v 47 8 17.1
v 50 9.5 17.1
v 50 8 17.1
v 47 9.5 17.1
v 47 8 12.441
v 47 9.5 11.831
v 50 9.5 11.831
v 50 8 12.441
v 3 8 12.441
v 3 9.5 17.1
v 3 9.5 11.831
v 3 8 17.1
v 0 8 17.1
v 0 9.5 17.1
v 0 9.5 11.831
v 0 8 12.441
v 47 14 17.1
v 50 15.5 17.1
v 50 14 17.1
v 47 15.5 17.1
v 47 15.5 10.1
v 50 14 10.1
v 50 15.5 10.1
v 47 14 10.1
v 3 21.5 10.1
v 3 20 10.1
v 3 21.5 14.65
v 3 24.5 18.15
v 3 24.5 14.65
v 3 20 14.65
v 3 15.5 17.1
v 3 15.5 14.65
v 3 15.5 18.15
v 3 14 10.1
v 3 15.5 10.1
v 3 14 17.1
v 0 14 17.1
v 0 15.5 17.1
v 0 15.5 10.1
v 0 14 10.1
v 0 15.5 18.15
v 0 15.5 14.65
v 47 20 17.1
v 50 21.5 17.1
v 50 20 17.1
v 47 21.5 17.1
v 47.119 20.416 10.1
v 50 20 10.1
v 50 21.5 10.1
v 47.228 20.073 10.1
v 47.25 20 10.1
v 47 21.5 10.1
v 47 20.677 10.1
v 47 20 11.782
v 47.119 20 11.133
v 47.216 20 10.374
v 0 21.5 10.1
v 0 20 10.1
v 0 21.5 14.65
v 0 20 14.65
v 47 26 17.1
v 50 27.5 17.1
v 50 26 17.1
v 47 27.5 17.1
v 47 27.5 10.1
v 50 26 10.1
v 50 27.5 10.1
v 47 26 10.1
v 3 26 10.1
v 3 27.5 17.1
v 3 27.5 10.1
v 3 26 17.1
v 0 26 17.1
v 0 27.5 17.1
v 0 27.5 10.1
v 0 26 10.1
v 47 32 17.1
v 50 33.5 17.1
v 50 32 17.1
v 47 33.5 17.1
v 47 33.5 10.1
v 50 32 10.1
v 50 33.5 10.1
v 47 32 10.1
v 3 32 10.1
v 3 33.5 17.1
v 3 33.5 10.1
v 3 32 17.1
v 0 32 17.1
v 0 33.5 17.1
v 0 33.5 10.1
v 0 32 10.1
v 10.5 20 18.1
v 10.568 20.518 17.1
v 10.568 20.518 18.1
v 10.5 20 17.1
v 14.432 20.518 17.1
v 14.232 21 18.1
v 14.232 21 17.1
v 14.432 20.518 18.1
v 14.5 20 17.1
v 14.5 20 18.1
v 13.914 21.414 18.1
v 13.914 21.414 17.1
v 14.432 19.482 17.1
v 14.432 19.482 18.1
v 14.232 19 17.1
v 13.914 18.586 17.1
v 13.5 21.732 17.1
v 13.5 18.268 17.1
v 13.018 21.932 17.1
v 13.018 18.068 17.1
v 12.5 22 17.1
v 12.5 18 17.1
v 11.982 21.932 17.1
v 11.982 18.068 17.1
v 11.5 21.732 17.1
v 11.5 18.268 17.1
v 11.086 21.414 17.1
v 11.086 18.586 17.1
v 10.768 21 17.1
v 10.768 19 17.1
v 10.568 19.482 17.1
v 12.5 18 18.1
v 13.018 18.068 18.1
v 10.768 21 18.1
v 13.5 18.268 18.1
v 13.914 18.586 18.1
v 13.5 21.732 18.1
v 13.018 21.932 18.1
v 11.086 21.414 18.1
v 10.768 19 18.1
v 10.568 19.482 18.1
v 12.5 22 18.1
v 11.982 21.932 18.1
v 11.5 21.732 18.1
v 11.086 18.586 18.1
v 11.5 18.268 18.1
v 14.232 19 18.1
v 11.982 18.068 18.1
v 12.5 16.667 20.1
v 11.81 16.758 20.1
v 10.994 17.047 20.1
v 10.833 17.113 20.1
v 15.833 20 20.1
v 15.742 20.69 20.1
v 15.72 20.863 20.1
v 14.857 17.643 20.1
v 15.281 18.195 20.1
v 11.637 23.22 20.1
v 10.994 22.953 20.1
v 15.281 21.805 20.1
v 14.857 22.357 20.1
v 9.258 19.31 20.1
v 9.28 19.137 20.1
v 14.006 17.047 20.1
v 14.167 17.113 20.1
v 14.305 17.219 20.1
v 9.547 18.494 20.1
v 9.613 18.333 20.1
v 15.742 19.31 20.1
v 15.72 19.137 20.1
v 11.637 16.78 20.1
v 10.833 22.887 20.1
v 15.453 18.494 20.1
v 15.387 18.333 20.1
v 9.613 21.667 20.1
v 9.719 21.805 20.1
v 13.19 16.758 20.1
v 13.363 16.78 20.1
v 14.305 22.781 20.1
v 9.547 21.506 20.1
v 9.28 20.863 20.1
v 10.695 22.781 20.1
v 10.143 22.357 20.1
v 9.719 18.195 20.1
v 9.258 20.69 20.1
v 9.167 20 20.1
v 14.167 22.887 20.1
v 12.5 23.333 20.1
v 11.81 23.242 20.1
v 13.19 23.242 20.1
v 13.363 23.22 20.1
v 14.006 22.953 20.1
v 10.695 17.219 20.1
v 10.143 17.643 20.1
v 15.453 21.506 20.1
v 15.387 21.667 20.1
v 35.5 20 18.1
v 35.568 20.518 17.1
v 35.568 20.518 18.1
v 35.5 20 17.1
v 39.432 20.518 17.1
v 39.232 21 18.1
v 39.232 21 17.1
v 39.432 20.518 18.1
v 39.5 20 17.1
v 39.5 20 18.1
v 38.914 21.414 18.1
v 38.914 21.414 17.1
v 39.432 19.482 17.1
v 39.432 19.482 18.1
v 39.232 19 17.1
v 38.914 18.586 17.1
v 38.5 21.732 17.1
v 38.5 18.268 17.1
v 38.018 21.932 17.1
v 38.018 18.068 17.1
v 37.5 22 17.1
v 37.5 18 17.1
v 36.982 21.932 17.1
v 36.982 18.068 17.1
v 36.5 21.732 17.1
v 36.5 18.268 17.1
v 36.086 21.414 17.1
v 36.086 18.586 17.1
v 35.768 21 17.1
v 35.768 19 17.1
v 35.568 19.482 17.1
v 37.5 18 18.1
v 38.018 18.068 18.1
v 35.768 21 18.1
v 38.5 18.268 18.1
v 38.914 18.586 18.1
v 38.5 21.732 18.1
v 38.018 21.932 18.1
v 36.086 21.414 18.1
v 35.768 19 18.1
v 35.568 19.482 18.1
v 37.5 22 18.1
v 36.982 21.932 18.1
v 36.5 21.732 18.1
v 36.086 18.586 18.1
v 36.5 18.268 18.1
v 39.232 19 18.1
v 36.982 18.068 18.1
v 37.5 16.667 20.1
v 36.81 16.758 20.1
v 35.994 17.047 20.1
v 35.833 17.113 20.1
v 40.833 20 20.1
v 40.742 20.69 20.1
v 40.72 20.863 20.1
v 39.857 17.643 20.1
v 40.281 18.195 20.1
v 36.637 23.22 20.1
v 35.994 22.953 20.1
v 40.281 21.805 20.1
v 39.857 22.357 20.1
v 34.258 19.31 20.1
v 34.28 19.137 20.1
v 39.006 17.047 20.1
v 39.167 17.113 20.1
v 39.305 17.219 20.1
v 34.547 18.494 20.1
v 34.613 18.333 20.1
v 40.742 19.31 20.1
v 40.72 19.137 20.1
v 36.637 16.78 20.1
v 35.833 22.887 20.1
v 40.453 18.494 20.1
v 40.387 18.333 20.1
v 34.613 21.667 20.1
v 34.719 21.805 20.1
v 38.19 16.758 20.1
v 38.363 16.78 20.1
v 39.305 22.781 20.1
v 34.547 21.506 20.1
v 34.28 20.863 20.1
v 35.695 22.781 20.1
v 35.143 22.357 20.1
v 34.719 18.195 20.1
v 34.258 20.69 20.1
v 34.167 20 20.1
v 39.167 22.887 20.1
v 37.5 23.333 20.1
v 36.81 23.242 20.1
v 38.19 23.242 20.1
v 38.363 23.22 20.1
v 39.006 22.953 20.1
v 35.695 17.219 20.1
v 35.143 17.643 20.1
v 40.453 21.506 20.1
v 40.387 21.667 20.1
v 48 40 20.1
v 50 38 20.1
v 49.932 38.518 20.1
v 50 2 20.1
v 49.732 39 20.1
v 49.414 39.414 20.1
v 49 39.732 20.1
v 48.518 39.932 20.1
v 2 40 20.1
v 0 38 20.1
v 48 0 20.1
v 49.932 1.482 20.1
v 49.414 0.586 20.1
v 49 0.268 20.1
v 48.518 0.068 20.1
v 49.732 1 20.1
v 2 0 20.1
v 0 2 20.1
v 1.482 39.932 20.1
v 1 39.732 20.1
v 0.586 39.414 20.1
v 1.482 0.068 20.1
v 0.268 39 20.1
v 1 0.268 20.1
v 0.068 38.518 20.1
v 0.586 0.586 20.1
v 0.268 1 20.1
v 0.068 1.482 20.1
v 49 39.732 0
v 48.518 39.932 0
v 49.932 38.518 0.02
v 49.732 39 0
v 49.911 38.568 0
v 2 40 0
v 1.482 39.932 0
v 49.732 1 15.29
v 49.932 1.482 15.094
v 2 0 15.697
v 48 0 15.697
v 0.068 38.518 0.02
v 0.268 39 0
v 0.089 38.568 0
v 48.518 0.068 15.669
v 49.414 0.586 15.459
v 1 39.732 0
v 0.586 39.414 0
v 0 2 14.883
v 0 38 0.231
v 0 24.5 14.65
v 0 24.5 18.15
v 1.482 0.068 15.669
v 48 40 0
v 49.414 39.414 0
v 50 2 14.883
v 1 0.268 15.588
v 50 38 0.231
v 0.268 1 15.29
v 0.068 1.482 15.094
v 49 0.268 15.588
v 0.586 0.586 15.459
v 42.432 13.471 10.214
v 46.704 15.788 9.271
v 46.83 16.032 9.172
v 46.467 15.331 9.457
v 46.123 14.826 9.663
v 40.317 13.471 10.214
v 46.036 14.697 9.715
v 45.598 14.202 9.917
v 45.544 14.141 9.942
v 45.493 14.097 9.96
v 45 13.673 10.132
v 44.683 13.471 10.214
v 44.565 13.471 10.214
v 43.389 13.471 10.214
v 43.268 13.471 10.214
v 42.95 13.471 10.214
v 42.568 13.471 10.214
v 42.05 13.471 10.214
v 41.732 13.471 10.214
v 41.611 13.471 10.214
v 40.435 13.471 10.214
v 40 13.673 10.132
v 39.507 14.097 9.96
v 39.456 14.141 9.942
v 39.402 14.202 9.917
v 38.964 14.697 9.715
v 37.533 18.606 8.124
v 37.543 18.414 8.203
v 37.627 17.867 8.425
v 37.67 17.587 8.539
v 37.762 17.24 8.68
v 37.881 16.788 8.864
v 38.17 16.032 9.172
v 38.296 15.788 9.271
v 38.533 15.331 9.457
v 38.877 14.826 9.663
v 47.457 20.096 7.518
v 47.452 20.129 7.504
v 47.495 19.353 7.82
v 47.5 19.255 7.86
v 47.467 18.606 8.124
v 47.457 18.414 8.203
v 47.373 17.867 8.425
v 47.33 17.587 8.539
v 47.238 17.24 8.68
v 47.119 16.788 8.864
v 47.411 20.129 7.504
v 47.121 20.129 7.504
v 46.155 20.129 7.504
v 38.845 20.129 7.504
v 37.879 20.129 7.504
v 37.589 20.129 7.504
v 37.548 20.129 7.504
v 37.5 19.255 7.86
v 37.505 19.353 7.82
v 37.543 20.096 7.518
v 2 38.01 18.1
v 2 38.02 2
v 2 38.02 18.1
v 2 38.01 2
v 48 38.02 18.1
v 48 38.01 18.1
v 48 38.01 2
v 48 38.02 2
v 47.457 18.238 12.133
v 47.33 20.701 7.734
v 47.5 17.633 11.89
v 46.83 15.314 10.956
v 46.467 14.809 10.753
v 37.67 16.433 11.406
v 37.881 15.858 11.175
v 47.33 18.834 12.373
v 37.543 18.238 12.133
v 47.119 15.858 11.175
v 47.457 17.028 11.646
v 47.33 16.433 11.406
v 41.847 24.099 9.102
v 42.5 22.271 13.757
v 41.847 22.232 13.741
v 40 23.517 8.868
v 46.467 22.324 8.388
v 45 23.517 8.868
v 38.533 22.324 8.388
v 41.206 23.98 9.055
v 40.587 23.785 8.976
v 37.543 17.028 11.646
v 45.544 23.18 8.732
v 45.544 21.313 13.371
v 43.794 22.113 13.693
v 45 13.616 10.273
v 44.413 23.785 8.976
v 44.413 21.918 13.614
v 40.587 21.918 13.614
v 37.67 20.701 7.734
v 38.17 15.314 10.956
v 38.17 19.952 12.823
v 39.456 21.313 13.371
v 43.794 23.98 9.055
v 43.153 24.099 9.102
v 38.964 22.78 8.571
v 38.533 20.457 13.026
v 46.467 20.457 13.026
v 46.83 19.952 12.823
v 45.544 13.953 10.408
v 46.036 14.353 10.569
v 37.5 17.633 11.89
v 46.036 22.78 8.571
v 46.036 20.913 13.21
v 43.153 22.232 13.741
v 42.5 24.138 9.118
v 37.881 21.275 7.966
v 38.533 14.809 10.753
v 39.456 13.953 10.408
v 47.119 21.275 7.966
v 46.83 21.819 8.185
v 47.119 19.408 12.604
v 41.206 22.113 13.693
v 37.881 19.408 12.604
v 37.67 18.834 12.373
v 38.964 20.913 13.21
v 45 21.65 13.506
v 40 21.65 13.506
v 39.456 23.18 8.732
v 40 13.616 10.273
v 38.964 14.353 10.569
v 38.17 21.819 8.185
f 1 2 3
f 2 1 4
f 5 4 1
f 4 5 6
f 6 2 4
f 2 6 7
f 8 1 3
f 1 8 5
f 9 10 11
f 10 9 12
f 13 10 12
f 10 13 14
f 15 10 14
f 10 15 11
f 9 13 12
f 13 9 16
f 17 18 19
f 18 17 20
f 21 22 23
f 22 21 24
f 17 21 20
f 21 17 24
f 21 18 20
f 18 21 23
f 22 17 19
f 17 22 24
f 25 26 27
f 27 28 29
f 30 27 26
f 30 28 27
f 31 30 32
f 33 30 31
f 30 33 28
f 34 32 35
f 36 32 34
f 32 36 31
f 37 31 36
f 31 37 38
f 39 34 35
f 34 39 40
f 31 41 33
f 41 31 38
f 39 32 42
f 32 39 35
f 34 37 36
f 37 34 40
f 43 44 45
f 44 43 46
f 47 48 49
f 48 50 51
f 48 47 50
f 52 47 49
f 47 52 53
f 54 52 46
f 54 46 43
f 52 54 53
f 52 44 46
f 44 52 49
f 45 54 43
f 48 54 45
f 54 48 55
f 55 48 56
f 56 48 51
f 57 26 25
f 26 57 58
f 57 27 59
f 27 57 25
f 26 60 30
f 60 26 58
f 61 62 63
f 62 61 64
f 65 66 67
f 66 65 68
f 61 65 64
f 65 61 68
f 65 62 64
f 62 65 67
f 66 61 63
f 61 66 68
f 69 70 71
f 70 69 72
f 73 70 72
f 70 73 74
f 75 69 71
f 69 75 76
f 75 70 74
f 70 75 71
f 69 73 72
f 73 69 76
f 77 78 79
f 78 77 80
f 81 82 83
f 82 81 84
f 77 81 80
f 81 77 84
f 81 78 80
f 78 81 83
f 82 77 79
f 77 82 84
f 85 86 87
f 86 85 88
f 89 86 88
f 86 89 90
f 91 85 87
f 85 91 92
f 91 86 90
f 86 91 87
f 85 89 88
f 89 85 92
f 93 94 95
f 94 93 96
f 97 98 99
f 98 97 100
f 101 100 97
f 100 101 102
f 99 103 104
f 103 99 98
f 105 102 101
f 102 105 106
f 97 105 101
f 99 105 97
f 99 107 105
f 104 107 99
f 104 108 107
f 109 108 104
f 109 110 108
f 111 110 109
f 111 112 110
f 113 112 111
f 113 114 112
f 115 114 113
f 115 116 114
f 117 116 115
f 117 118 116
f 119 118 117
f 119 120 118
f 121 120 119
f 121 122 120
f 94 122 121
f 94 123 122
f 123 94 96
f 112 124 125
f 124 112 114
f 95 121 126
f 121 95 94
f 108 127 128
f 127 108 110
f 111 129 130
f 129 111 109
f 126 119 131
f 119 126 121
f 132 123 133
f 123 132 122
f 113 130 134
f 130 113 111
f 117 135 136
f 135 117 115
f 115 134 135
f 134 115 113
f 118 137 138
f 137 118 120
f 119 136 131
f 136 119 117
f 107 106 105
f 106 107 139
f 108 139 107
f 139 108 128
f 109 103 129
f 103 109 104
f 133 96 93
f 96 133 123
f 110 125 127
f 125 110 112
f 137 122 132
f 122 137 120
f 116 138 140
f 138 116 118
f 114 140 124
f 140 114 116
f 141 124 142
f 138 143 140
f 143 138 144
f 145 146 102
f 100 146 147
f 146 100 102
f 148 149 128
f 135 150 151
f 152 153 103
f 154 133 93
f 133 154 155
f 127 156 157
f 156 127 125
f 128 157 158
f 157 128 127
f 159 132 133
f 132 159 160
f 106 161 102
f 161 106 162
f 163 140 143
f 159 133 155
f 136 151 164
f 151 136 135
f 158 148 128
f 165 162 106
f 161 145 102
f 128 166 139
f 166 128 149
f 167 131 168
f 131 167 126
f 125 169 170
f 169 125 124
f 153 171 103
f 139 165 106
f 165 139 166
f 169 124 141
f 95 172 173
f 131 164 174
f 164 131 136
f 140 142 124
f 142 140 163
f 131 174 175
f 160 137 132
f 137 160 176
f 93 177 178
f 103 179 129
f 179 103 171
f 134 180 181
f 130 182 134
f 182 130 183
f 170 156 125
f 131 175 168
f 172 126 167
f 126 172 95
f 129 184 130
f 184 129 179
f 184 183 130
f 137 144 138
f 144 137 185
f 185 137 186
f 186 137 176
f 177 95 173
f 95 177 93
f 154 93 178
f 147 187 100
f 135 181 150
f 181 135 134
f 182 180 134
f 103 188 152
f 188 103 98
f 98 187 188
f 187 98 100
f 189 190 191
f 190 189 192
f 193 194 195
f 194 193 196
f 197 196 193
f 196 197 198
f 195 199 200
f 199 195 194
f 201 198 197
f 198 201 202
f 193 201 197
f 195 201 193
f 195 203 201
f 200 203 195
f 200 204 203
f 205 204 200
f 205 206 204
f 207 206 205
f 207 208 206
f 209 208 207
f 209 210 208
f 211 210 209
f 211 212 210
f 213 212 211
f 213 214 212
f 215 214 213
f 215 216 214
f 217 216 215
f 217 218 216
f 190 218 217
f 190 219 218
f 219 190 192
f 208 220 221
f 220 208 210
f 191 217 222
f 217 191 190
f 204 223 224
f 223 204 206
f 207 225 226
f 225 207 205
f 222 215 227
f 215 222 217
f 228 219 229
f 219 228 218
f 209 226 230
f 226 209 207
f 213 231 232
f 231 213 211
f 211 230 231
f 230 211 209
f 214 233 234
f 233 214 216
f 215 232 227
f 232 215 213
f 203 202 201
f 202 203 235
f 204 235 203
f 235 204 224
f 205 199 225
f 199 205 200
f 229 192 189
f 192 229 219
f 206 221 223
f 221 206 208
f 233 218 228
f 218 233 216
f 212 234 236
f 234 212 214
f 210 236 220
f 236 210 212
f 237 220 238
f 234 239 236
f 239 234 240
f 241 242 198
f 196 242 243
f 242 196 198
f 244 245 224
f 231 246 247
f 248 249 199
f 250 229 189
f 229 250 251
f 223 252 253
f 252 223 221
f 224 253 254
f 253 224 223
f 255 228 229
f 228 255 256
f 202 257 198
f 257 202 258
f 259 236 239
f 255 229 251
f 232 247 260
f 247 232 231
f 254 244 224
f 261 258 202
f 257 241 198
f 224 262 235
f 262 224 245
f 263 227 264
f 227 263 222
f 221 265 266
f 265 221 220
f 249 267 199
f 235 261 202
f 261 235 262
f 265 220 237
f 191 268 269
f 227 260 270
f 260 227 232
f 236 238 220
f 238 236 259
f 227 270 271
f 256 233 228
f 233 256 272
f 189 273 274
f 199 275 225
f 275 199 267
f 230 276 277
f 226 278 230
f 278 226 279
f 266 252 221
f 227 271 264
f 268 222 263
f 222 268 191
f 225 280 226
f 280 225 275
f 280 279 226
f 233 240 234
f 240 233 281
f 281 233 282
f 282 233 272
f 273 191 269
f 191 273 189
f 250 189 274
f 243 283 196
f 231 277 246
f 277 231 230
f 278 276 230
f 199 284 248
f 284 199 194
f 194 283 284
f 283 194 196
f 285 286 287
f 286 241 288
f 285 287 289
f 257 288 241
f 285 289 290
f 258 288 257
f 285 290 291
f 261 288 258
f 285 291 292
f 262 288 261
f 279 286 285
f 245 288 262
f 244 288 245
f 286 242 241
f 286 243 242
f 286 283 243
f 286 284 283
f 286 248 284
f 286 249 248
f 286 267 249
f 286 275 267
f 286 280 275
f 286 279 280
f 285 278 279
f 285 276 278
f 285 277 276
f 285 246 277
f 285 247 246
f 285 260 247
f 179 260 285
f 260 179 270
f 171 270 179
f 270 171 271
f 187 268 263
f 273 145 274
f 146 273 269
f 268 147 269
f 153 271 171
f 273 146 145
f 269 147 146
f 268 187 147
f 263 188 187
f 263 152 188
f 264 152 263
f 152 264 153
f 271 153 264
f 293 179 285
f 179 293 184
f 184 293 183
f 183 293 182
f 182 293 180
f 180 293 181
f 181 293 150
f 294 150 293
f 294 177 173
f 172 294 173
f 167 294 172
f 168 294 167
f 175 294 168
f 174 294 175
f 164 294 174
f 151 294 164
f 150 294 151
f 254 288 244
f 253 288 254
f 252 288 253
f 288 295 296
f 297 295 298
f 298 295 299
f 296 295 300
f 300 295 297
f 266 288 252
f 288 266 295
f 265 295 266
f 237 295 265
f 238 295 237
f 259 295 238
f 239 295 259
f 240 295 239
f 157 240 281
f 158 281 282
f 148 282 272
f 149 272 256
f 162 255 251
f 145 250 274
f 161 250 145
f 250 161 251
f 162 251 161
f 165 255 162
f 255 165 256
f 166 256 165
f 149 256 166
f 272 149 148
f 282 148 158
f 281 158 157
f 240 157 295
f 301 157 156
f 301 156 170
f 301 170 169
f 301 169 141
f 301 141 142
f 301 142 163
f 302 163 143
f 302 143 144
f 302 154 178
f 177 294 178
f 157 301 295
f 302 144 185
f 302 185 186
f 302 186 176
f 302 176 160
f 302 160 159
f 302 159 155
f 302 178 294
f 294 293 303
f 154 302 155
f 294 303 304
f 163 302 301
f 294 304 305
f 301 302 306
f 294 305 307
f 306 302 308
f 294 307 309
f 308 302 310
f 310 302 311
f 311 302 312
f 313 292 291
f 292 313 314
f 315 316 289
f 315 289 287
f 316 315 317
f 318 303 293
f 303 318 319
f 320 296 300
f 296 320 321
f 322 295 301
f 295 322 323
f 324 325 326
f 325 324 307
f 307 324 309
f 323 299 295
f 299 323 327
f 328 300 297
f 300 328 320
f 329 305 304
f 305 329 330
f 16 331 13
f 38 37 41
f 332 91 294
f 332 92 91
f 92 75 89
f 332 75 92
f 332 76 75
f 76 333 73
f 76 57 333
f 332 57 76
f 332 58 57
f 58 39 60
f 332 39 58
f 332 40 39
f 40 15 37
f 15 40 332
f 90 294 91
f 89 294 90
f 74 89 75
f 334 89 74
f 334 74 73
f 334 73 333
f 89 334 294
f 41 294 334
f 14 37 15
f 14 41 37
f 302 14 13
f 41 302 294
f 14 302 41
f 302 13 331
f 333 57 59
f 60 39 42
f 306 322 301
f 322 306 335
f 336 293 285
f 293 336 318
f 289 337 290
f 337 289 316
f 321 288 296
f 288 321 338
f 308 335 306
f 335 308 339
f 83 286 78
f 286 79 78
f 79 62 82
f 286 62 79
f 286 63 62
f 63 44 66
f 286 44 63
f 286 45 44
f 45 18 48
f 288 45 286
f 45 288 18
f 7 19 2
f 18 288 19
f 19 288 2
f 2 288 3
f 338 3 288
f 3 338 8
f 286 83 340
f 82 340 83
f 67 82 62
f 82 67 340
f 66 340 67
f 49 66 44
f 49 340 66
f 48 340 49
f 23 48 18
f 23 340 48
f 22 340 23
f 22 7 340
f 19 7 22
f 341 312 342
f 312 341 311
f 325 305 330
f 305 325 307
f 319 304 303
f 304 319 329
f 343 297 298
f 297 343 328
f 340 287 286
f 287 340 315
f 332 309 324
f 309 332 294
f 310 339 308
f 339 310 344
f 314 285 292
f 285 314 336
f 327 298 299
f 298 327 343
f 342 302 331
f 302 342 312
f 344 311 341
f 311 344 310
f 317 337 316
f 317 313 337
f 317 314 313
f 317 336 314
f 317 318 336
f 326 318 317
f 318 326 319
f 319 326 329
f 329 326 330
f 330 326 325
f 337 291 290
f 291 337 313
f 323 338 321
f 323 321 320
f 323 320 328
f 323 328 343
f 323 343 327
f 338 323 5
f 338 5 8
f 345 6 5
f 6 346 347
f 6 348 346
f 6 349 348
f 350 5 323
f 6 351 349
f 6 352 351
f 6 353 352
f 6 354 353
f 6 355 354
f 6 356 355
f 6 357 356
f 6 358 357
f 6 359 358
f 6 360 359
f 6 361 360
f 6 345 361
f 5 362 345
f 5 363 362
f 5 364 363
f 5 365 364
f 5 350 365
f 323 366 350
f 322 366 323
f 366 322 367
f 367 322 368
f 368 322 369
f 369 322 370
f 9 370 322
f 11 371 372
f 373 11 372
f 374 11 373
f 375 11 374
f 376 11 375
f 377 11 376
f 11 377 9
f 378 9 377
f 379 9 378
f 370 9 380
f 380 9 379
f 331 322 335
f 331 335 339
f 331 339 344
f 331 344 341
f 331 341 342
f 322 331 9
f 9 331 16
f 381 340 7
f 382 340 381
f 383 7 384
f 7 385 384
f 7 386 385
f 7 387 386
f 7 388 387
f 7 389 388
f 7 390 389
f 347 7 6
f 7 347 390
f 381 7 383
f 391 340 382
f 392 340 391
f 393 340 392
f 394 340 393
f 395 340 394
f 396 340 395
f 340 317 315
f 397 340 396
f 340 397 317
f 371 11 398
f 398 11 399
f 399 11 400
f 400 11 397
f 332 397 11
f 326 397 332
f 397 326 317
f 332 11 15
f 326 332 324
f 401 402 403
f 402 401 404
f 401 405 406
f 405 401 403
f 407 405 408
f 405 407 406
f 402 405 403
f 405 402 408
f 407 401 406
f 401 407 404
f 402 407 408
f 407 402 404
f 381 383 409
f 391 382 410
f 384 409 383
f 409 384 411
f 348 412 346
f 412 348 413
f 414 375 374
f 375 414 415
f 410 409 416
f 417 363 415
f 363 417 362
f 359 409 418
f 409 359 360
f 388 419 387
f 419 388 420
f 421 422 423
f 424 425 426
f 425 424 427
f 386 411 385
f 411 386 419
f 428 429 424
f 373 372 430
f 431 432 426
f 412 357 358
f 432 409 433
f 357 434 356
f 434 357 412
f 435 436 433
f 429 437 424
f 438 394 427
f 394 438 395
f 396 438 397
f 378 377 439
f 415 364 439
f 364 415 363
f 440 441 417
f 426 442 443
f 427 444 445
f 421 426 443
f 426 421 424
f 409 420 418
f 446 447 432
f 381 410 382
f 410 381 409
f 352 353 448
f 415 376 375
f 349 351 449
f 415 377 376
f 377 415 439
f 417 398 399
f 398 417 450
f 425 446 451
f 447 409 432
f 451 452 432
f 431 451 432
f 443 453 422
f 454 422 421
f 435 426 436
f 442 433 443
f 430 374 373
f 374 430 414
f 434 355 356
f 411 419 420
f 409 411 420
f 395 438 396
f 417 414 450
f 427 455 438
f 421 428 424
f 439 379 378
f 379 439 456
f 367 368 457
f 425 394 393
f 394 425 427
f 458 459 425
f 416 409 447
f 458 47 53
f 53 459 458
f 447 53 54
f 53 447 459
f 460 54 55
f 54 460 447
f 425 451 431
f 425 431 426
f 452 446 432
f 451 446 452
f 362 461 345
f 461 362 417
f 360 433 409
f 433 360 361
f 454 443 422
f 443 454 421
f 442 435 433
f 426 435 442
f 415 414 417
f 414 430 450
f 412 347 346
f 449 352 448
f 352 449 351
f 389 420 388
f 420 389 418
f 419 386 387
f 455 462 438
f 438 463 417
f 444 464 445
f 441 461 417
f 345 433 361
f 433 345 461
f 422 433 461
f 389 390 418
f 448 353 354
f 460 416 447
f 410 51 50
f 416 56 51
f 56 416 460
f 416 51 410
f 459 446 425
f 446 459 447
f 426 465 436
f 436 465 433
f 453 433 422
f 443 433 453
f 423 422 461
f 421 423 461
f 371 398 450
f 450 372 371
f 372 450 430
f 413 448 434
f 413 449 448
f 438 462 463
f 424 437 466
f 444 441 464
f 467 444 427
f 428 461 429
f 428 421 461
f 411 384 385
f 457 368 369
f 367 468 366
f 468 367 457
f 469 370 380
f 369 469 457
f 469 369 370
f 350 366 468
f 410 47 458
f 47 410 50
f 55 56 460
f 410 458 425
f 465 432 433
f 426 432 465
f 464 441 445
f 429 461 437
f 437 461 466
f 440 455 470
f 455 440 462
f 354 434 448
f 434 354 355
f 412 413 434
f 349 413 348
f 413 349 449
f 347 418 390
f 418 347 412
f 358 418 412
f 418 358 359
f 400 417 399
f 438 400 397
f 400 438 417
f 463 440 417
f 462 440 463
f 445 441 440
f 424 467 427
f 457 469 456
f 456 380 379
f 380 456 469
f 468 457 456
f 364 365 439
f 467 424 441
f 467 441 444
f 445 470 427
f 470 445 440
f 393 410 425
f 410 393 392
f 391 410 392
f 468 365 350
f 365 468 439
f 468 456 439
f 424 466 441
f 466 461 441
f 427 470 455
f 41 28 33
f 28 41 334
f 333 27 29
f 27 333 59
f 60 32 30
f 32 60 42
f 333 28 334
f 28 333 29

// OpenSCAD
// StoveIQ Enclosure — Parametric Wedge Design v2
// Under-cabinet mount: flat top against cabinet, angled bottom faces stove
// Camera looks DOWN through angled bottom face
// Nick DeMarco — 2026-03-30
//
//  CABINET SURFACE (flat)
//  ┌─────────────────────┐ ← flat top, mounts to cabinet
//  │                     │
//  │   PCB sits here     │  back_h (tall, toward wall)
//  │                     │
//  └─────────\           │  front_h (short, toward room)
//     IR window \────────┘
//        looks    \
//         down      \ ← 35° angle toward stove
//          at         \
//          stove        ▼

/* [Board Dimensions] */
pcb_w = 45;          // PCB width (X) mm
pcb_d = 35;          // PCB depth (Y) mm
pcb_h = 1.6;         // PCB thickness mm

/* [Component Heights] */
buzzer_h = 9.5;      // Tallest component (buzzer)
sensor_h = 4.5;      // MLX90640 TO-39 height
sensor_dia = 9.2;    // TO-39 can diameter
usbc_w = 9;          // USB-C width
usbc_h = 3.5;        // USB-C height

/* [Sensor Position — from PCB origin (bottom-left)] */
sensor_pcb_x = 40;   // MLX90640 X on PCB
sensor_pcb_y = 17;   // MLX90640 Y on PCB

/* [Enclosure] */
wall = 2.0;          // Shell thickness
gap = 0.5;           // PCB clearance all around
standoff_h = 3;      // PCB standoff height above floor
sensor_angle = 35;   // Camera tilt from vertical (degrees)
corner_r = 2;        // Fillet radius
ir_aperture = 10;    // IR window diameter (> sensor for FOV margin)

/* [Derived — don't edit] */
// Internal cavity
cav_w = pcb_w + gap * 2;
cav_d = pcb_d + gap * 2;
comp_h = buzzer_h + pcb_h + standoff_h + 2; // total internal height needed

// Outer box
out_w = cav_w + wall * 2;  // ~50mm
out_d = cav_d + wall * 2;  // ~40mm

// Wedge: back wall is full height, front is shorter
// The bottom face tilts at sensor_angle
back_h = comp_h + wall * 2;         // full height at back (wall side)
front_h = back_h - out_d * tan(sensor_angle);
safe_front_h = max(front_h, wall + 2);

echo(str("=== StoveIQ Enclosure ==="));
echo(str("Outer: ", out_w, " x ", out_d, "mm"));
echo(str("Back height: ", back_h, "mm"));
echo(str("Front height: ", safe_front_h, "mm"));
echo(str("Sensor angle: ", sensor_angle, "°"));

// ============================================================
// HELPERS
// ============================================================
module rcube(w, d, h, r) {
    // Rounded-corner box
    hull() for (x=[r, w-r], y=[r, d-r])
        translate([x, y, 0]) cylinder(h=h, r=r, $fn=24);
}

// ============================================================
// MAIN ENCLOSURE — open bottom, wedge profile
// The TOP is flat (cabinet mount surface)
// The BOTTOM is angled (camera face, faces stove)
// ============================================================
module enclosure() {
    difference() {
        // Outer wedge solid
        hull() {
            // Back edge (y=out_d) — full height
            translate([0, out_d - 0.01, 0])
                rcube(out_w, 0.01, back_h, corner_r);
            // Front edge (y=0) — shorter
            translate([0, 0, 0])
                rcube(out_w, 0.01, safe_front_h, corner_r);
        }

        // Hollow cavity — offset by wall on all sides
        // Same wedge profile but smaller
        hull() {
            translate([wall, out_d - 0.01, wall])
                cube([cav_w, 0.01, back_h - wall * 2]);
            translate([wall, wall, wall])
                cube([cav_w, 0.01, safe_front_h - wall * 2]);
        }

        // --- CUTOUTS ---

        // IR CAMERA WINDOW — hole through the angled bottom face
        // The bottom face slopes from z=0 at back to z=0 at front
        // but the bottom is actually the angled surface
        // Since the top is flat at z=back_h (back) and z=safe_front_h (front),
        // and the bottom is at z=0, the angled face IS the top.
        // Wait — let me reconsider: for under-cabinet mount,
        // the flat surface (TOP at z=back_h) goes against the cabinet.
        // The BOTTOM face at z=0 is what faces the stove.
        // But z=0 is flat... The wedge slopes the TOP face.
        //
        // CORRECTION: The wedge should slope the BOTTOM, not the top.
        // Flat top = cabinet mount. Angled bottom = camera face.
        // I need to flip the geometry.
    }
}

// ============================================================
// BETTER APPROACH: flat top, angled bottom
// ============================================================
module enclosure_v2() {
    // The top face is flat at z = back_h (constant)
    // The bottom face angles from z=0 at back to z=(back_h - safe_front_h) at front
    // This means the front is THINNER and the bottom slopes up toward the front

    total_h = back_h; // constant top height

    difference() {
        // Outer solid — simple box, then cut the angled bottom
        rcube(out_w, out_d, total_h, corner_r);

        // Cut angled bottom face — a wedge-shaped removal from below
        // Remove everything below the angled plane
        // The plane goes from z=0 at y=out_d (back) to z=(total_h - safe_front_h) at y=0 (front)
        bottom_rise = total_h - safe_front_h; // how much the bottom rises at front

        if (bottom_rise > 0) {
            hull() {
                // Front: cut up to bottom_rise
                translate([-1, -1, -1])
                    cube([out_w + 2, 0.01, bottom_rise + 1]);
                // Back: cut nothing (z=0, zero-height wedge)
                translate([-1, out_d + 0.99, -1])
                    cube([out_w + 2, 0.01, 0.01]);
            }
        }

        // Hollow out cavity — same angled floor, inset by wall
        inner_bottom_rise = bottom_rise + wall; // inner floor is wall above outer
        translate([wall, wall, 0])
            hull() {
                // Front inner floor
                translate([0, -0.01, inner_bottom_rise])
                    cube([cav_w, 0.01, total_h - wall - inner_bottom_rise]);
                // Back inner floor
                translate([0, cav_d + 0.01, wall])
                    cube([cav_w, 0.01, total_h - wall * 2]);
            }

        // --- IR CAMERA WINDOW ---
        // Hole through the angled bottom face
        // The sensor sits at (sensor_pcb_x, sensor_pcb_y) on the PCB
        // PCB origin in enclosure coords: (wall+gap, wall+gap, floor + standoff_h)
        sx = wall + gap + sensor_pcb_x;
        sy = wall + gap + sensor_pcb_y;

        // The angled bottom surface height at this Y position:
        frac = 1 - (sy / out_d); // 0 at back, 1 at front
        z_floor = frac * bottom_rise;

        // Cut perpendicular to the angled surface
        // Surface normal angle from vertical:
        floor_angle = atan2(bottom_rise, out_d);

        translate([sx, sy, z_floor - 1])
            rotate([floor_angle, 0, 0])
                cylinder(h=wall + 3, d=ir_aperture, $fn=48);

        // --- USB-C PORT ---
        // Left side (x=0), centered on PCB depth
        usb_y = wall + gap + pcb_d/2;
        frac_usb = 1 - (usb_y / out_d);
        z_floor_usb = frac_usb * bottom_rise;
        usb_z = z_floor_usb + wall + standoff_h + pcb_h;

        translate([-1, usb_y - usbc_w/2, usb_z])
            cube([wall + 2, usbc_w, usbc_h]);

        // --- LED WINDOW ---
        // WS2812B at PCB (20, 31) — front face
        led_x = wall + gap + 20;
        translate([led_x - 2.5, -1, total_h - safe_front_h + wall + standoff_h + pcb_h])
            cube([5, wall + 2, 4]);

        // --- BUTTON ACCESS ---
        // SW1 at PCB (5, 31), SW2 at PCB (12, 31) — front face
        for (bx = [5, 12]) {
            translate([wall + gap + bx - 3, -1,
                       total_h - safe_front_h + wall + standoff_h + pcb_h])
                cube([6, wall + 2, 4]);
        }

        // --- VENT SLOTS (sides) ---
        for (i = [0:4]) {
            vy = 8 + i * 6;
            // Right side
            translate([out_w - wall - 1, vy, total_h - 10])
                cube([wall + 2, 1.5, 7]);
            // Left side
            translate([-1, vy, total_h - 10])
                cube([wall + 2, 1.5, 7]);
        }

        // --- MOUNTING HOLES (top face, countersunk for cabinet screws) ---
        for (mx = [out_w * 0.25, out_w * 0.75]) {
            translate([mx, out_d/2, total_h - wall - 1]) {
                cylinder(h=wall + 2, d=4, $fn=24);   // Through hole
                translate([0, 0, 1])
                    cylinder(h=wall + 1, d1=4, d2=8, $fn=24); // Countersink
            }
        }
    }

    // --- PCB STANDOFFS ---
    for (x = [wall + gap + 3, wall + gap + pcb_w - 3],
         y = [wall + gap + 3, wall + gap + pcb_d - 3]) {
        frac_s = 1 - (y / out_d);
        z_floor_s = frac_s * (total_h - safe_front_h);
        translate([x, y, z_floor_s + wall]) {
            difference() {
                cylinder(h=standoff_h, d=5, $fn=24);
                cylinder(h=standoff_h + 1, d=2.2, $fn=24);
            }
        }
    }
}

// ============================================================
// PCB + COMPONENTS MOCKUP (transparent overlay)
// ============================================================
module pcb_ghost() {
    bottom_rise = back_h - safe_front_h;

    // PCB position
    pcb_x = wall + gap;
    pcb_y = wall + gap;
    frac_pcb_back = 1 - ((pcb_y + pcb_d) / out_d);
    frac_pcb_front = 1 - (pcb_y / out_d);
    // PCB sits on standoffs, back edge:
    z_back = frac_pcb_back * bottom_rise + wall + standoff_h;
    z_front = frac_pcb_front * bottom_rise + wall + standoff_h;
    z_pcb = (z_back + z_front) / 2; // approximate average

    // Green PCB
    color("green", 0.6)
        translate([pcb_x, pcb_y, z_pcb])
            cube([pcb_w, pcb_d, pcb_h]);

    // MLX90640 (silver TO-39 can)
    color("silver", 0.8)
        translate([pcb_x + sensor_pcb_x, pcb_y + sensor_pcb_y, z_pcb + pcb_h])
            cylinder(h=sensor_h, d=sensor_dia, $fn=32);

    // Buzzer (black cylinder)
    color("DarkSlateGray", 0.8)
        translate([pcb_x + 35, pcb_y + 29, z_pcb + pcb_h])
            cylinder(h=buzzer_h, d=12, $fn=32);

    // USB-C (silver rectangle)
    color("silver", 0.8)
        translate([pcb_x - 1, pcb_y + pcb_d/2 - usbc_w/2, z_pcb + pcb_h])
            cube([3, usbc_w, usbc_h]);

    // AMS1117 LDO
    color("DimGray", 0.8)
        translate([pcb_x + 16, pcb_y + 14, z_pcb + pcb_h])
            cube([6.5, 3.5, 1.8]);

    // Buttons
    for (bx = [5, 12])
        color("yellow", 0.8)
            translate([pcb_x + bx - 3, pcb_y + 28, z_pcb + pcb_h])
                cube([6, 6, 3.5]);
}

// ============================================================
// RENDER
// ============================================================

// Main enclosure
enclosure_v2();

// Ghost PCB overlay (transparent)
%pcb_ghost();
